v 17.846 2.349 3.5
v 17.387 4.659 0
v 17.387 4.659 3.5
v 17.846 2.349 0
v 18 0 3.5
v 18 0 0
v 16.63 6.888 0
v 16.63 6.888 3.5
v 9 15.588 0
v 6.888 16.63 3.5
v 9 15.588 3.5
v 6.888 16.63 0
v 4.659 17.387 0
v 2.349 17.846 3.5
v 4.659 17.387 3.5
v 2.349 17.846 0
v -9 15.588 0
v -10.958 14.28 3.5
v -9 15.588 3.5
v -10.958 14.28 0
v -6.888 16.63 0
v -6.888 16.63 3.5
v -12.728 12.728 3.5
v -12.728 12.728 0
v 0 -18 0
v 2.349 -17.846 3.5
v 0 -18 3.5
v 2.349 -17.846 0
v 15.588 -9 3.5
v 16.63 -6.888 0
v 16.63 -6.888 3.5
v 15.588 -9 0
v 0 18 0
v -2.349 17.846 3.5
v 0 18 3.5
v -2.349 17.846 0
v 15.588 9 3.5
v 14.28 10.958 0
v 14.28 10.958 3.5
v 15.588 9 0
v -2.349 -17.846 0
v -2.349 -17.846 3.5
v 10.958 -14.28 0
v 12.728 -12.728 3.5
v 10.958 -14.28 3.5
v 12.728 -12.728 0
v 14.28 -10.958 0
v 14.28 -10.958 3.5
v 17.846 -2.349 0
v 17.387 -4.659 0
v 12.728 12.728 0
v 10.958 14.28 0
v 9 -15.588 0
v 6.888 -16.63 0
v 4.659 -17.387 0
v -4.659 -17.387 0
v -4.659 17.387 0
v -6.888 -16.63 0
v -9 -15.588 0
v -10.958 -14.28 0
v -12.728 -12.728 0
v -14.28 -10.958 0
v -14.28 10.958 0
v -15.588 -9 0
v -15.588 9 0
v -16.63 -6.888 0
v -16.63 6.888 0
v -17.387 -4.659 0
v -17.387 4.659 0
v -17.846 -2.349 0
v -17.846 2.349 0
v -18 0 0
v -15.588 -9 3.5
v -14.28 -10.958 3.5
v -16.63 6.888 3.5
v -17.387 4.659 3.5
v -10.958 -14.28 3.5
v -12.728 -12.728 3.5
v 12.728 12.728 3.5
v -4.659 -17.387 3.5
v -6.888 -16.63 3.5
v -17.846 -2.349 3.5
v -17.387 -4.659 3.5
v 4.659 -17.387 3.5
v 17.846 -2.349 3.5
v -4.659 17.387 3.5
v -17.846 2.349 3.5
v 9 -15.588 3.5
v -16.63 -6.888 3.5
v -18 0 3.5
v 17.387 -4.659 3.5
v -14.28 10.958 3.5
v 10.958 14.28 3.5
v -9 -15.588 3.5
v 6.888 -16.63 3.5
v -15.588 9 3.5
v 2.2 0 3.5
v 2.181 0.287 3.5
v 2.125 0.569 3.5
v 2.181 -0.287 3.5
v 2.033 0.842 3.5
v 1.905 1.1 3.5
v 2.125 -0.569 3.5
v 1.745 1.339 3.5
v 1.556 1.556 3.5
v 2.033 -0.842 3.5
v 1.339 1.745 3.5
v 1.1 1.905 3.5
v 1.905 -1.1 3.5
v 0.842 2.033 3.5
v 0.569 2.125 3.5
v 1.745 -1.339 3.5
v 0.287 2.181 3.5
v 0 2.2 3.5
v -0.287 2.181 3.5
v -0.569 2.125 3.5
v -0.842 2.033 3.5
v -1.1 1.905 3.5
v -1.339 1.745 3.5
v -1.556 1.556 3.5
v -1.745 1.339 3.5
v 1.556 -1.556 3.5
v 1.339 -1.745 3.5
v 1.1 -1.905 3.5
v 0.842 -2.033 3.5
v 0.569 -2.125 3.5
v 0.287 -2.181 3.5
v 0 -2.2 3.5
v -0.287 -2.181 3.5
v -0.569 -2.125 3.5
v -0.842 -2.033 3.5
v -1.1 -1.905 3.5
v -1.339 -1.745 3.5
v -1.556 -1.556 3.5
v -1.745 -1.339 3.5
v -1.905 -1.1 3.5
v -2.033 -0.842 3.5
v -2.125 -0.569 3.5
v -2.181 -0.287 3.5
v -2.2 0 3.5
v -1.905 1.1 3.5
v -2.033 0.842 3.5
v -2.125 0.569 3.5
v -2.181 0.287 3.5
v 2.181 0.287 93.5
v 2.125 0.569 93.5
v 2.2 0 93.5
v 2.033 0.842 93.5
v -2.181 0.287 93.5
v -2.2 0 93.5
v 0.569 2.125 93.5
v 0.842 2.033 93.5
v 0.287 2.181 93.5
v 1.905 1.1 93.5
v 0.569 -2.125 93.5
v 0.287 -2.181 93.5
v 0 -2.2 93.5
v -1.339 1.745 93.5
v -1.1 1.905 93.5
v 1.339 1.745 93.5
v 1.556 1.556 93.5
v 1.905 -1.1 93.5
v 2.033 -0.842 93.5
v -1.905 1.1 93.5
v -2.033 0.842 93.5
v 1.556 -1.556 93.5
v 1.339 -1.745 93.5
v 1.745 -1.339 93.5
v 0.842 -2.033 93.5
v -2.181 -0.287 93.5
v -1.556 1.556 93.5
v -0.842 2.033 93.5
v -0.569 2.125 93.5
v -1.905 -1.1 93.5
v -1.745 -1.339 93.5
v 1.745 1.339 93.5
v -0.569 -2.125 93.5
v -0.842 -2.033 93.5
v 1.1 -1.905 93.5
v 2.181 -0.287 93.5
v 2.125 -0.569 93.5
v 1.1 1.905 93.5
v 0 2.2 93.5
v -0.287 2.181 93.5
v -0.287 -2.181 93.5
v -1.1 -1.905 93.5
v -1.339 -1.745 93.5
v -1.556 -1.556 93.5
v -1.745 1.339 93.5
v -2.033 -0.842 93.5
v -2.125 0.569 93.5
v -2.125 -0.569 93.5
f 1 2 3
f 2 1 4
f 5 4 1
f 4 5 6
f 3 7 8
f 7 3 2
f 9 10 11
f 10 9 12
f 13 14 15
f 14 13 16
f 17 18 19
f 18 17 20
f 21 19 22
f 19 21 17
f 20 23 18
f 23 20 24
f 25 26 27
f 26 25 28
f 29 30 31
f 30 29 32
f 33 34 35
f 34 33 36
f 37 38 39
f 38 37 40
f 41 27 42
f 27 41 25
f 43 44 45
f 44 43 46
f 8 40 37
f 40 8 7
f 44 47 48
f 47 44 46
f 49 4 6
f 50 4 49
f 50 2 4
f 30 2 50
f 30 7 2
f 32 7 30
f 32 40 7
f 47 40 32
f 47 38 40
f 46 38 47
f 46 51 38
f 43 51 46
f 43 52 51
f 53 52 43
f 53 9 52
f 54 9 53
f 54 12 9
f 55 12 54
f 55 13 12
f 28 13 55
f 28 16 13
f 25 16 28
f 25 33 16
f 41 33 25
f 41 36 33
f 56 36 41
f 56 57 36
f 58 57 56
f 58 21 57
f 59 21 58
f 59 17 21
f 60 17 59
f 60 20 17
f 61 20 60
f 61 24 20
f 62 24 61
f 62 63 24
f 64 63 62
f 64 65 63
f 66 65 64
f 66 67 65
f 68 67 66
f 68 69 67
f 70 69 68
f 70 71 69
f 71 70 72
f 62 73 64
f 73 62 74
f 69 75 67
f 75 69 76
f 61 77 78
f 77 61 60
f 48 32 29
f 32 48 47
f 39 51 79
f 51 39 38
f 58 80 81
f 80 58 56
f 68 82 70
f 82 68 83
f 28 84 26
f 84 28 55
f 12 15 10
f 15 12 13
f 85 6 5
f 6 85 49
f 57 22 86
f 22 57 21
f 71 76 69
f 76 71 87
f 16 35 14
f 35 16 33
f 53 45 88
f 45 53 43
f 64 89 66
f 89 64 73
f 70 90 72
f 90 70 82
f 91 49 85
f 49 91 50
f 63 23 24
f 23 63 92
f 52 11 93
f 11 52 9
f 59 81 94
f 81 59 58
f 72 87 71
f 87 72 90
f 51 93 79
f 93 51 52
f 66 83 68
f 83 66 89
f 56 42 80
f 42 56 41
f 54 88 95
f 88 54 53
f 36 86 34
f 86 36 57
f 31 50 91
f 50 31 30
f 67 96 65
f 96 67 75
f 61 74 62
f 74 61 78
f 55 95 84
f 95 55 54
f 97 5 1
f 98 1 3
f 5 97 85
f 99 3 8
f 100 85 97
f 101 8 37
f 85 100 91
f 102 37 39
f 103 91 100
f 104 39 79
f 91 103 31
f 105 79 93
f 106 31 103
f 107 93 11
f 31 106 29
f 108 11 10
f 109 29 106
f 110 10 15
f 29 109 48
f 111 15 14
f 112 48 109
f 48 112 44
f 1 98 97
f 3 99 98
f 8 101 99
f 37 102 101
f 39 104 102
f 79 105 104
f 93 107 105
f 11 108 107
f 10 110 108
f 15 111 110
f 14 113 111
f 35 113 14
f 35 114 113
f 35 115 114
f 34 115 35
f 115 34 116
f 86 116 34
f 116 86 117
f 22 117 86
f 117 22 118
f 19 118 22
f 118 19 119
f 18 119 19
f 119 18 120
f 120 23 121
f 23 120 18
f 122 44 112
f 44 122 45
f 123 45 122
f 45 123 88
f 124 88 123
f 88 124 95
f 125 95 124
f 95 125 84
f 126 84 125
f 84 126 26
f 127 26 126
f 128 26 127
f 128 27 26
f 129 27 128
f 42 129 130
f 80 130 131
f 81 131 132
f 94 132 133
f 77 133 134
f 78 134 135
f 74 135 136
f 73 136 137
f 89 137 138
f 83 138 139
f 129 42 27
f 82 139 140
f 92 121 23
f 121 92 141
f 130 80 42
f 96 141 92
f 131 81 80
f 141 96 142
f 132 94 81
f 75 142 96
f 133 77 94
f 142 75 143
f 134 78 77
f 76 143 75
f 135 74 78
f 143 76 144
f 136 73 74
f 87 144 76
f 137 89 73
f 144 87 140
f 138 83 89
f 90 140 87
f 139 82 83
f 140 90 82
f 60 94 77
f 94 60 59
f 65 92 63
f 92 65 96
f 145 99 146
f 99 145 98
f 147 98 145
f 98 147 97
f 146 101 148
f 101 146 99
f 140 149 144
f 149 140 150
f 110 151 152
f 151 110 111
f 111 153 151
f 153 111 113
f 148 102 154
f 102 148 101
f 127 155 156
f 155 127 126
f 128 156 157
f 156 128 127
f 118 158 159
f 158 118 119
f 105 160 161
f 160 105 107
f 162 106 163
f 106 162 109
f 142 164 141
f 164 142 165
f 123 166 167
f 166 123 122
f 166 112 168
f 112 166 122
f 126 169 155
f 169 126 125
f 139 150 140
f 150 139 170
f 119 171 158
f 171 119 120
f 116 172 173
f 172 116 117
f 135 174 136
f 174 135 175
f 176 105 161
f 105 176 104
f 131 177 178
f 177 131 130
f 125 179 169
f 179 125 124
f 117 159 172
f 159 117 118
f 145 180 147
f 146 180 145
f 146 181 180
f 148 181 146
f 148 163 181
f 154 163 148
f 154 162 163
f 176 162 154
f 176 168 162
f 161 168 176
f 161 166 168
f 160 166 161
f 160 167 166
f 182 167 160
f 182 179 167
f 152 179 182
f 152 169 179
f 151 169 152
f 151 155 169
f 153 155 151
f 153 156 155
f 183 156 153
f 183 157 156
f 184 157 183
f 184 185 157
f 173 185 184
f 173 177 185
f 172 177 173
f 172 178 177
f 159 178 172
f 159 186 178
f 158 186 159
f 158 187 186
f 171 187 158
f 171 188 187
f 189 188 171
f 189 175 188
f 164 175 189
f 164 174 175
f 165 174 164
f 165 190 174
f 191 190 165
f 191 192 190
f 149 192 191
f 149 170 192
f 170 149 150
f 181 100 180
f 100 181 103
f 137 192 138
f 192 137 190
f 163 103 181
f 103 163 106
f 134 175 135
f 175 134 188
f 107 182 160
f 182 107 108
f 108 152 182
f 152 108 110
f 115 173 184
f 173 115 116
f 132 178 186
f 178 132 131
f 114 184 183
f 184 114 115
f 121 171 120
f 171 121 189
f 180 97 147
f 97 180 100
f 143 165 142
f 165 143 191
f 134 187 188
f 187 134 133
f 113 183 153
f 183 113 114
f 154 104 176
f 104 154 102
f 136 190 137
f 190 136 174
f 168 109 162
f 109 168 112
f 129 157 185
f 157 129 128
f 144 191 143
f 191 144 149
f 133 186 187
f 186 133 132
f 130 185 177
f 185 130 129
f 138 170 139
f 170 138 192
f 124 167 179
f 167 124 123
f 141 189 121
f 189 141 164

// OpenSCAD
// BuildBuddy sat_clock — metal stand (life-size desk prop)
// openscad -o stand.stl -D 'stem_h=90' -D 'foot_r=18' assets/scad/sat_stand.scad

stem_r = 2.2;
stem_h = 90;
foot_r = 18;
foot_h = 3.5;
fn = 48;

union() {
  // foot disk at Y=0 plane (scene: foot on ground)
  translate([0, 0, foot_h / 2])
    cylinder(h = foot_h, r = foot_r, center = true, $fn = fn);
  translate([0, 0, foot_h + stem_h / 2])
    cylinder(h = stem_h, r = stem_r, center = true, $fn = fn);
}
